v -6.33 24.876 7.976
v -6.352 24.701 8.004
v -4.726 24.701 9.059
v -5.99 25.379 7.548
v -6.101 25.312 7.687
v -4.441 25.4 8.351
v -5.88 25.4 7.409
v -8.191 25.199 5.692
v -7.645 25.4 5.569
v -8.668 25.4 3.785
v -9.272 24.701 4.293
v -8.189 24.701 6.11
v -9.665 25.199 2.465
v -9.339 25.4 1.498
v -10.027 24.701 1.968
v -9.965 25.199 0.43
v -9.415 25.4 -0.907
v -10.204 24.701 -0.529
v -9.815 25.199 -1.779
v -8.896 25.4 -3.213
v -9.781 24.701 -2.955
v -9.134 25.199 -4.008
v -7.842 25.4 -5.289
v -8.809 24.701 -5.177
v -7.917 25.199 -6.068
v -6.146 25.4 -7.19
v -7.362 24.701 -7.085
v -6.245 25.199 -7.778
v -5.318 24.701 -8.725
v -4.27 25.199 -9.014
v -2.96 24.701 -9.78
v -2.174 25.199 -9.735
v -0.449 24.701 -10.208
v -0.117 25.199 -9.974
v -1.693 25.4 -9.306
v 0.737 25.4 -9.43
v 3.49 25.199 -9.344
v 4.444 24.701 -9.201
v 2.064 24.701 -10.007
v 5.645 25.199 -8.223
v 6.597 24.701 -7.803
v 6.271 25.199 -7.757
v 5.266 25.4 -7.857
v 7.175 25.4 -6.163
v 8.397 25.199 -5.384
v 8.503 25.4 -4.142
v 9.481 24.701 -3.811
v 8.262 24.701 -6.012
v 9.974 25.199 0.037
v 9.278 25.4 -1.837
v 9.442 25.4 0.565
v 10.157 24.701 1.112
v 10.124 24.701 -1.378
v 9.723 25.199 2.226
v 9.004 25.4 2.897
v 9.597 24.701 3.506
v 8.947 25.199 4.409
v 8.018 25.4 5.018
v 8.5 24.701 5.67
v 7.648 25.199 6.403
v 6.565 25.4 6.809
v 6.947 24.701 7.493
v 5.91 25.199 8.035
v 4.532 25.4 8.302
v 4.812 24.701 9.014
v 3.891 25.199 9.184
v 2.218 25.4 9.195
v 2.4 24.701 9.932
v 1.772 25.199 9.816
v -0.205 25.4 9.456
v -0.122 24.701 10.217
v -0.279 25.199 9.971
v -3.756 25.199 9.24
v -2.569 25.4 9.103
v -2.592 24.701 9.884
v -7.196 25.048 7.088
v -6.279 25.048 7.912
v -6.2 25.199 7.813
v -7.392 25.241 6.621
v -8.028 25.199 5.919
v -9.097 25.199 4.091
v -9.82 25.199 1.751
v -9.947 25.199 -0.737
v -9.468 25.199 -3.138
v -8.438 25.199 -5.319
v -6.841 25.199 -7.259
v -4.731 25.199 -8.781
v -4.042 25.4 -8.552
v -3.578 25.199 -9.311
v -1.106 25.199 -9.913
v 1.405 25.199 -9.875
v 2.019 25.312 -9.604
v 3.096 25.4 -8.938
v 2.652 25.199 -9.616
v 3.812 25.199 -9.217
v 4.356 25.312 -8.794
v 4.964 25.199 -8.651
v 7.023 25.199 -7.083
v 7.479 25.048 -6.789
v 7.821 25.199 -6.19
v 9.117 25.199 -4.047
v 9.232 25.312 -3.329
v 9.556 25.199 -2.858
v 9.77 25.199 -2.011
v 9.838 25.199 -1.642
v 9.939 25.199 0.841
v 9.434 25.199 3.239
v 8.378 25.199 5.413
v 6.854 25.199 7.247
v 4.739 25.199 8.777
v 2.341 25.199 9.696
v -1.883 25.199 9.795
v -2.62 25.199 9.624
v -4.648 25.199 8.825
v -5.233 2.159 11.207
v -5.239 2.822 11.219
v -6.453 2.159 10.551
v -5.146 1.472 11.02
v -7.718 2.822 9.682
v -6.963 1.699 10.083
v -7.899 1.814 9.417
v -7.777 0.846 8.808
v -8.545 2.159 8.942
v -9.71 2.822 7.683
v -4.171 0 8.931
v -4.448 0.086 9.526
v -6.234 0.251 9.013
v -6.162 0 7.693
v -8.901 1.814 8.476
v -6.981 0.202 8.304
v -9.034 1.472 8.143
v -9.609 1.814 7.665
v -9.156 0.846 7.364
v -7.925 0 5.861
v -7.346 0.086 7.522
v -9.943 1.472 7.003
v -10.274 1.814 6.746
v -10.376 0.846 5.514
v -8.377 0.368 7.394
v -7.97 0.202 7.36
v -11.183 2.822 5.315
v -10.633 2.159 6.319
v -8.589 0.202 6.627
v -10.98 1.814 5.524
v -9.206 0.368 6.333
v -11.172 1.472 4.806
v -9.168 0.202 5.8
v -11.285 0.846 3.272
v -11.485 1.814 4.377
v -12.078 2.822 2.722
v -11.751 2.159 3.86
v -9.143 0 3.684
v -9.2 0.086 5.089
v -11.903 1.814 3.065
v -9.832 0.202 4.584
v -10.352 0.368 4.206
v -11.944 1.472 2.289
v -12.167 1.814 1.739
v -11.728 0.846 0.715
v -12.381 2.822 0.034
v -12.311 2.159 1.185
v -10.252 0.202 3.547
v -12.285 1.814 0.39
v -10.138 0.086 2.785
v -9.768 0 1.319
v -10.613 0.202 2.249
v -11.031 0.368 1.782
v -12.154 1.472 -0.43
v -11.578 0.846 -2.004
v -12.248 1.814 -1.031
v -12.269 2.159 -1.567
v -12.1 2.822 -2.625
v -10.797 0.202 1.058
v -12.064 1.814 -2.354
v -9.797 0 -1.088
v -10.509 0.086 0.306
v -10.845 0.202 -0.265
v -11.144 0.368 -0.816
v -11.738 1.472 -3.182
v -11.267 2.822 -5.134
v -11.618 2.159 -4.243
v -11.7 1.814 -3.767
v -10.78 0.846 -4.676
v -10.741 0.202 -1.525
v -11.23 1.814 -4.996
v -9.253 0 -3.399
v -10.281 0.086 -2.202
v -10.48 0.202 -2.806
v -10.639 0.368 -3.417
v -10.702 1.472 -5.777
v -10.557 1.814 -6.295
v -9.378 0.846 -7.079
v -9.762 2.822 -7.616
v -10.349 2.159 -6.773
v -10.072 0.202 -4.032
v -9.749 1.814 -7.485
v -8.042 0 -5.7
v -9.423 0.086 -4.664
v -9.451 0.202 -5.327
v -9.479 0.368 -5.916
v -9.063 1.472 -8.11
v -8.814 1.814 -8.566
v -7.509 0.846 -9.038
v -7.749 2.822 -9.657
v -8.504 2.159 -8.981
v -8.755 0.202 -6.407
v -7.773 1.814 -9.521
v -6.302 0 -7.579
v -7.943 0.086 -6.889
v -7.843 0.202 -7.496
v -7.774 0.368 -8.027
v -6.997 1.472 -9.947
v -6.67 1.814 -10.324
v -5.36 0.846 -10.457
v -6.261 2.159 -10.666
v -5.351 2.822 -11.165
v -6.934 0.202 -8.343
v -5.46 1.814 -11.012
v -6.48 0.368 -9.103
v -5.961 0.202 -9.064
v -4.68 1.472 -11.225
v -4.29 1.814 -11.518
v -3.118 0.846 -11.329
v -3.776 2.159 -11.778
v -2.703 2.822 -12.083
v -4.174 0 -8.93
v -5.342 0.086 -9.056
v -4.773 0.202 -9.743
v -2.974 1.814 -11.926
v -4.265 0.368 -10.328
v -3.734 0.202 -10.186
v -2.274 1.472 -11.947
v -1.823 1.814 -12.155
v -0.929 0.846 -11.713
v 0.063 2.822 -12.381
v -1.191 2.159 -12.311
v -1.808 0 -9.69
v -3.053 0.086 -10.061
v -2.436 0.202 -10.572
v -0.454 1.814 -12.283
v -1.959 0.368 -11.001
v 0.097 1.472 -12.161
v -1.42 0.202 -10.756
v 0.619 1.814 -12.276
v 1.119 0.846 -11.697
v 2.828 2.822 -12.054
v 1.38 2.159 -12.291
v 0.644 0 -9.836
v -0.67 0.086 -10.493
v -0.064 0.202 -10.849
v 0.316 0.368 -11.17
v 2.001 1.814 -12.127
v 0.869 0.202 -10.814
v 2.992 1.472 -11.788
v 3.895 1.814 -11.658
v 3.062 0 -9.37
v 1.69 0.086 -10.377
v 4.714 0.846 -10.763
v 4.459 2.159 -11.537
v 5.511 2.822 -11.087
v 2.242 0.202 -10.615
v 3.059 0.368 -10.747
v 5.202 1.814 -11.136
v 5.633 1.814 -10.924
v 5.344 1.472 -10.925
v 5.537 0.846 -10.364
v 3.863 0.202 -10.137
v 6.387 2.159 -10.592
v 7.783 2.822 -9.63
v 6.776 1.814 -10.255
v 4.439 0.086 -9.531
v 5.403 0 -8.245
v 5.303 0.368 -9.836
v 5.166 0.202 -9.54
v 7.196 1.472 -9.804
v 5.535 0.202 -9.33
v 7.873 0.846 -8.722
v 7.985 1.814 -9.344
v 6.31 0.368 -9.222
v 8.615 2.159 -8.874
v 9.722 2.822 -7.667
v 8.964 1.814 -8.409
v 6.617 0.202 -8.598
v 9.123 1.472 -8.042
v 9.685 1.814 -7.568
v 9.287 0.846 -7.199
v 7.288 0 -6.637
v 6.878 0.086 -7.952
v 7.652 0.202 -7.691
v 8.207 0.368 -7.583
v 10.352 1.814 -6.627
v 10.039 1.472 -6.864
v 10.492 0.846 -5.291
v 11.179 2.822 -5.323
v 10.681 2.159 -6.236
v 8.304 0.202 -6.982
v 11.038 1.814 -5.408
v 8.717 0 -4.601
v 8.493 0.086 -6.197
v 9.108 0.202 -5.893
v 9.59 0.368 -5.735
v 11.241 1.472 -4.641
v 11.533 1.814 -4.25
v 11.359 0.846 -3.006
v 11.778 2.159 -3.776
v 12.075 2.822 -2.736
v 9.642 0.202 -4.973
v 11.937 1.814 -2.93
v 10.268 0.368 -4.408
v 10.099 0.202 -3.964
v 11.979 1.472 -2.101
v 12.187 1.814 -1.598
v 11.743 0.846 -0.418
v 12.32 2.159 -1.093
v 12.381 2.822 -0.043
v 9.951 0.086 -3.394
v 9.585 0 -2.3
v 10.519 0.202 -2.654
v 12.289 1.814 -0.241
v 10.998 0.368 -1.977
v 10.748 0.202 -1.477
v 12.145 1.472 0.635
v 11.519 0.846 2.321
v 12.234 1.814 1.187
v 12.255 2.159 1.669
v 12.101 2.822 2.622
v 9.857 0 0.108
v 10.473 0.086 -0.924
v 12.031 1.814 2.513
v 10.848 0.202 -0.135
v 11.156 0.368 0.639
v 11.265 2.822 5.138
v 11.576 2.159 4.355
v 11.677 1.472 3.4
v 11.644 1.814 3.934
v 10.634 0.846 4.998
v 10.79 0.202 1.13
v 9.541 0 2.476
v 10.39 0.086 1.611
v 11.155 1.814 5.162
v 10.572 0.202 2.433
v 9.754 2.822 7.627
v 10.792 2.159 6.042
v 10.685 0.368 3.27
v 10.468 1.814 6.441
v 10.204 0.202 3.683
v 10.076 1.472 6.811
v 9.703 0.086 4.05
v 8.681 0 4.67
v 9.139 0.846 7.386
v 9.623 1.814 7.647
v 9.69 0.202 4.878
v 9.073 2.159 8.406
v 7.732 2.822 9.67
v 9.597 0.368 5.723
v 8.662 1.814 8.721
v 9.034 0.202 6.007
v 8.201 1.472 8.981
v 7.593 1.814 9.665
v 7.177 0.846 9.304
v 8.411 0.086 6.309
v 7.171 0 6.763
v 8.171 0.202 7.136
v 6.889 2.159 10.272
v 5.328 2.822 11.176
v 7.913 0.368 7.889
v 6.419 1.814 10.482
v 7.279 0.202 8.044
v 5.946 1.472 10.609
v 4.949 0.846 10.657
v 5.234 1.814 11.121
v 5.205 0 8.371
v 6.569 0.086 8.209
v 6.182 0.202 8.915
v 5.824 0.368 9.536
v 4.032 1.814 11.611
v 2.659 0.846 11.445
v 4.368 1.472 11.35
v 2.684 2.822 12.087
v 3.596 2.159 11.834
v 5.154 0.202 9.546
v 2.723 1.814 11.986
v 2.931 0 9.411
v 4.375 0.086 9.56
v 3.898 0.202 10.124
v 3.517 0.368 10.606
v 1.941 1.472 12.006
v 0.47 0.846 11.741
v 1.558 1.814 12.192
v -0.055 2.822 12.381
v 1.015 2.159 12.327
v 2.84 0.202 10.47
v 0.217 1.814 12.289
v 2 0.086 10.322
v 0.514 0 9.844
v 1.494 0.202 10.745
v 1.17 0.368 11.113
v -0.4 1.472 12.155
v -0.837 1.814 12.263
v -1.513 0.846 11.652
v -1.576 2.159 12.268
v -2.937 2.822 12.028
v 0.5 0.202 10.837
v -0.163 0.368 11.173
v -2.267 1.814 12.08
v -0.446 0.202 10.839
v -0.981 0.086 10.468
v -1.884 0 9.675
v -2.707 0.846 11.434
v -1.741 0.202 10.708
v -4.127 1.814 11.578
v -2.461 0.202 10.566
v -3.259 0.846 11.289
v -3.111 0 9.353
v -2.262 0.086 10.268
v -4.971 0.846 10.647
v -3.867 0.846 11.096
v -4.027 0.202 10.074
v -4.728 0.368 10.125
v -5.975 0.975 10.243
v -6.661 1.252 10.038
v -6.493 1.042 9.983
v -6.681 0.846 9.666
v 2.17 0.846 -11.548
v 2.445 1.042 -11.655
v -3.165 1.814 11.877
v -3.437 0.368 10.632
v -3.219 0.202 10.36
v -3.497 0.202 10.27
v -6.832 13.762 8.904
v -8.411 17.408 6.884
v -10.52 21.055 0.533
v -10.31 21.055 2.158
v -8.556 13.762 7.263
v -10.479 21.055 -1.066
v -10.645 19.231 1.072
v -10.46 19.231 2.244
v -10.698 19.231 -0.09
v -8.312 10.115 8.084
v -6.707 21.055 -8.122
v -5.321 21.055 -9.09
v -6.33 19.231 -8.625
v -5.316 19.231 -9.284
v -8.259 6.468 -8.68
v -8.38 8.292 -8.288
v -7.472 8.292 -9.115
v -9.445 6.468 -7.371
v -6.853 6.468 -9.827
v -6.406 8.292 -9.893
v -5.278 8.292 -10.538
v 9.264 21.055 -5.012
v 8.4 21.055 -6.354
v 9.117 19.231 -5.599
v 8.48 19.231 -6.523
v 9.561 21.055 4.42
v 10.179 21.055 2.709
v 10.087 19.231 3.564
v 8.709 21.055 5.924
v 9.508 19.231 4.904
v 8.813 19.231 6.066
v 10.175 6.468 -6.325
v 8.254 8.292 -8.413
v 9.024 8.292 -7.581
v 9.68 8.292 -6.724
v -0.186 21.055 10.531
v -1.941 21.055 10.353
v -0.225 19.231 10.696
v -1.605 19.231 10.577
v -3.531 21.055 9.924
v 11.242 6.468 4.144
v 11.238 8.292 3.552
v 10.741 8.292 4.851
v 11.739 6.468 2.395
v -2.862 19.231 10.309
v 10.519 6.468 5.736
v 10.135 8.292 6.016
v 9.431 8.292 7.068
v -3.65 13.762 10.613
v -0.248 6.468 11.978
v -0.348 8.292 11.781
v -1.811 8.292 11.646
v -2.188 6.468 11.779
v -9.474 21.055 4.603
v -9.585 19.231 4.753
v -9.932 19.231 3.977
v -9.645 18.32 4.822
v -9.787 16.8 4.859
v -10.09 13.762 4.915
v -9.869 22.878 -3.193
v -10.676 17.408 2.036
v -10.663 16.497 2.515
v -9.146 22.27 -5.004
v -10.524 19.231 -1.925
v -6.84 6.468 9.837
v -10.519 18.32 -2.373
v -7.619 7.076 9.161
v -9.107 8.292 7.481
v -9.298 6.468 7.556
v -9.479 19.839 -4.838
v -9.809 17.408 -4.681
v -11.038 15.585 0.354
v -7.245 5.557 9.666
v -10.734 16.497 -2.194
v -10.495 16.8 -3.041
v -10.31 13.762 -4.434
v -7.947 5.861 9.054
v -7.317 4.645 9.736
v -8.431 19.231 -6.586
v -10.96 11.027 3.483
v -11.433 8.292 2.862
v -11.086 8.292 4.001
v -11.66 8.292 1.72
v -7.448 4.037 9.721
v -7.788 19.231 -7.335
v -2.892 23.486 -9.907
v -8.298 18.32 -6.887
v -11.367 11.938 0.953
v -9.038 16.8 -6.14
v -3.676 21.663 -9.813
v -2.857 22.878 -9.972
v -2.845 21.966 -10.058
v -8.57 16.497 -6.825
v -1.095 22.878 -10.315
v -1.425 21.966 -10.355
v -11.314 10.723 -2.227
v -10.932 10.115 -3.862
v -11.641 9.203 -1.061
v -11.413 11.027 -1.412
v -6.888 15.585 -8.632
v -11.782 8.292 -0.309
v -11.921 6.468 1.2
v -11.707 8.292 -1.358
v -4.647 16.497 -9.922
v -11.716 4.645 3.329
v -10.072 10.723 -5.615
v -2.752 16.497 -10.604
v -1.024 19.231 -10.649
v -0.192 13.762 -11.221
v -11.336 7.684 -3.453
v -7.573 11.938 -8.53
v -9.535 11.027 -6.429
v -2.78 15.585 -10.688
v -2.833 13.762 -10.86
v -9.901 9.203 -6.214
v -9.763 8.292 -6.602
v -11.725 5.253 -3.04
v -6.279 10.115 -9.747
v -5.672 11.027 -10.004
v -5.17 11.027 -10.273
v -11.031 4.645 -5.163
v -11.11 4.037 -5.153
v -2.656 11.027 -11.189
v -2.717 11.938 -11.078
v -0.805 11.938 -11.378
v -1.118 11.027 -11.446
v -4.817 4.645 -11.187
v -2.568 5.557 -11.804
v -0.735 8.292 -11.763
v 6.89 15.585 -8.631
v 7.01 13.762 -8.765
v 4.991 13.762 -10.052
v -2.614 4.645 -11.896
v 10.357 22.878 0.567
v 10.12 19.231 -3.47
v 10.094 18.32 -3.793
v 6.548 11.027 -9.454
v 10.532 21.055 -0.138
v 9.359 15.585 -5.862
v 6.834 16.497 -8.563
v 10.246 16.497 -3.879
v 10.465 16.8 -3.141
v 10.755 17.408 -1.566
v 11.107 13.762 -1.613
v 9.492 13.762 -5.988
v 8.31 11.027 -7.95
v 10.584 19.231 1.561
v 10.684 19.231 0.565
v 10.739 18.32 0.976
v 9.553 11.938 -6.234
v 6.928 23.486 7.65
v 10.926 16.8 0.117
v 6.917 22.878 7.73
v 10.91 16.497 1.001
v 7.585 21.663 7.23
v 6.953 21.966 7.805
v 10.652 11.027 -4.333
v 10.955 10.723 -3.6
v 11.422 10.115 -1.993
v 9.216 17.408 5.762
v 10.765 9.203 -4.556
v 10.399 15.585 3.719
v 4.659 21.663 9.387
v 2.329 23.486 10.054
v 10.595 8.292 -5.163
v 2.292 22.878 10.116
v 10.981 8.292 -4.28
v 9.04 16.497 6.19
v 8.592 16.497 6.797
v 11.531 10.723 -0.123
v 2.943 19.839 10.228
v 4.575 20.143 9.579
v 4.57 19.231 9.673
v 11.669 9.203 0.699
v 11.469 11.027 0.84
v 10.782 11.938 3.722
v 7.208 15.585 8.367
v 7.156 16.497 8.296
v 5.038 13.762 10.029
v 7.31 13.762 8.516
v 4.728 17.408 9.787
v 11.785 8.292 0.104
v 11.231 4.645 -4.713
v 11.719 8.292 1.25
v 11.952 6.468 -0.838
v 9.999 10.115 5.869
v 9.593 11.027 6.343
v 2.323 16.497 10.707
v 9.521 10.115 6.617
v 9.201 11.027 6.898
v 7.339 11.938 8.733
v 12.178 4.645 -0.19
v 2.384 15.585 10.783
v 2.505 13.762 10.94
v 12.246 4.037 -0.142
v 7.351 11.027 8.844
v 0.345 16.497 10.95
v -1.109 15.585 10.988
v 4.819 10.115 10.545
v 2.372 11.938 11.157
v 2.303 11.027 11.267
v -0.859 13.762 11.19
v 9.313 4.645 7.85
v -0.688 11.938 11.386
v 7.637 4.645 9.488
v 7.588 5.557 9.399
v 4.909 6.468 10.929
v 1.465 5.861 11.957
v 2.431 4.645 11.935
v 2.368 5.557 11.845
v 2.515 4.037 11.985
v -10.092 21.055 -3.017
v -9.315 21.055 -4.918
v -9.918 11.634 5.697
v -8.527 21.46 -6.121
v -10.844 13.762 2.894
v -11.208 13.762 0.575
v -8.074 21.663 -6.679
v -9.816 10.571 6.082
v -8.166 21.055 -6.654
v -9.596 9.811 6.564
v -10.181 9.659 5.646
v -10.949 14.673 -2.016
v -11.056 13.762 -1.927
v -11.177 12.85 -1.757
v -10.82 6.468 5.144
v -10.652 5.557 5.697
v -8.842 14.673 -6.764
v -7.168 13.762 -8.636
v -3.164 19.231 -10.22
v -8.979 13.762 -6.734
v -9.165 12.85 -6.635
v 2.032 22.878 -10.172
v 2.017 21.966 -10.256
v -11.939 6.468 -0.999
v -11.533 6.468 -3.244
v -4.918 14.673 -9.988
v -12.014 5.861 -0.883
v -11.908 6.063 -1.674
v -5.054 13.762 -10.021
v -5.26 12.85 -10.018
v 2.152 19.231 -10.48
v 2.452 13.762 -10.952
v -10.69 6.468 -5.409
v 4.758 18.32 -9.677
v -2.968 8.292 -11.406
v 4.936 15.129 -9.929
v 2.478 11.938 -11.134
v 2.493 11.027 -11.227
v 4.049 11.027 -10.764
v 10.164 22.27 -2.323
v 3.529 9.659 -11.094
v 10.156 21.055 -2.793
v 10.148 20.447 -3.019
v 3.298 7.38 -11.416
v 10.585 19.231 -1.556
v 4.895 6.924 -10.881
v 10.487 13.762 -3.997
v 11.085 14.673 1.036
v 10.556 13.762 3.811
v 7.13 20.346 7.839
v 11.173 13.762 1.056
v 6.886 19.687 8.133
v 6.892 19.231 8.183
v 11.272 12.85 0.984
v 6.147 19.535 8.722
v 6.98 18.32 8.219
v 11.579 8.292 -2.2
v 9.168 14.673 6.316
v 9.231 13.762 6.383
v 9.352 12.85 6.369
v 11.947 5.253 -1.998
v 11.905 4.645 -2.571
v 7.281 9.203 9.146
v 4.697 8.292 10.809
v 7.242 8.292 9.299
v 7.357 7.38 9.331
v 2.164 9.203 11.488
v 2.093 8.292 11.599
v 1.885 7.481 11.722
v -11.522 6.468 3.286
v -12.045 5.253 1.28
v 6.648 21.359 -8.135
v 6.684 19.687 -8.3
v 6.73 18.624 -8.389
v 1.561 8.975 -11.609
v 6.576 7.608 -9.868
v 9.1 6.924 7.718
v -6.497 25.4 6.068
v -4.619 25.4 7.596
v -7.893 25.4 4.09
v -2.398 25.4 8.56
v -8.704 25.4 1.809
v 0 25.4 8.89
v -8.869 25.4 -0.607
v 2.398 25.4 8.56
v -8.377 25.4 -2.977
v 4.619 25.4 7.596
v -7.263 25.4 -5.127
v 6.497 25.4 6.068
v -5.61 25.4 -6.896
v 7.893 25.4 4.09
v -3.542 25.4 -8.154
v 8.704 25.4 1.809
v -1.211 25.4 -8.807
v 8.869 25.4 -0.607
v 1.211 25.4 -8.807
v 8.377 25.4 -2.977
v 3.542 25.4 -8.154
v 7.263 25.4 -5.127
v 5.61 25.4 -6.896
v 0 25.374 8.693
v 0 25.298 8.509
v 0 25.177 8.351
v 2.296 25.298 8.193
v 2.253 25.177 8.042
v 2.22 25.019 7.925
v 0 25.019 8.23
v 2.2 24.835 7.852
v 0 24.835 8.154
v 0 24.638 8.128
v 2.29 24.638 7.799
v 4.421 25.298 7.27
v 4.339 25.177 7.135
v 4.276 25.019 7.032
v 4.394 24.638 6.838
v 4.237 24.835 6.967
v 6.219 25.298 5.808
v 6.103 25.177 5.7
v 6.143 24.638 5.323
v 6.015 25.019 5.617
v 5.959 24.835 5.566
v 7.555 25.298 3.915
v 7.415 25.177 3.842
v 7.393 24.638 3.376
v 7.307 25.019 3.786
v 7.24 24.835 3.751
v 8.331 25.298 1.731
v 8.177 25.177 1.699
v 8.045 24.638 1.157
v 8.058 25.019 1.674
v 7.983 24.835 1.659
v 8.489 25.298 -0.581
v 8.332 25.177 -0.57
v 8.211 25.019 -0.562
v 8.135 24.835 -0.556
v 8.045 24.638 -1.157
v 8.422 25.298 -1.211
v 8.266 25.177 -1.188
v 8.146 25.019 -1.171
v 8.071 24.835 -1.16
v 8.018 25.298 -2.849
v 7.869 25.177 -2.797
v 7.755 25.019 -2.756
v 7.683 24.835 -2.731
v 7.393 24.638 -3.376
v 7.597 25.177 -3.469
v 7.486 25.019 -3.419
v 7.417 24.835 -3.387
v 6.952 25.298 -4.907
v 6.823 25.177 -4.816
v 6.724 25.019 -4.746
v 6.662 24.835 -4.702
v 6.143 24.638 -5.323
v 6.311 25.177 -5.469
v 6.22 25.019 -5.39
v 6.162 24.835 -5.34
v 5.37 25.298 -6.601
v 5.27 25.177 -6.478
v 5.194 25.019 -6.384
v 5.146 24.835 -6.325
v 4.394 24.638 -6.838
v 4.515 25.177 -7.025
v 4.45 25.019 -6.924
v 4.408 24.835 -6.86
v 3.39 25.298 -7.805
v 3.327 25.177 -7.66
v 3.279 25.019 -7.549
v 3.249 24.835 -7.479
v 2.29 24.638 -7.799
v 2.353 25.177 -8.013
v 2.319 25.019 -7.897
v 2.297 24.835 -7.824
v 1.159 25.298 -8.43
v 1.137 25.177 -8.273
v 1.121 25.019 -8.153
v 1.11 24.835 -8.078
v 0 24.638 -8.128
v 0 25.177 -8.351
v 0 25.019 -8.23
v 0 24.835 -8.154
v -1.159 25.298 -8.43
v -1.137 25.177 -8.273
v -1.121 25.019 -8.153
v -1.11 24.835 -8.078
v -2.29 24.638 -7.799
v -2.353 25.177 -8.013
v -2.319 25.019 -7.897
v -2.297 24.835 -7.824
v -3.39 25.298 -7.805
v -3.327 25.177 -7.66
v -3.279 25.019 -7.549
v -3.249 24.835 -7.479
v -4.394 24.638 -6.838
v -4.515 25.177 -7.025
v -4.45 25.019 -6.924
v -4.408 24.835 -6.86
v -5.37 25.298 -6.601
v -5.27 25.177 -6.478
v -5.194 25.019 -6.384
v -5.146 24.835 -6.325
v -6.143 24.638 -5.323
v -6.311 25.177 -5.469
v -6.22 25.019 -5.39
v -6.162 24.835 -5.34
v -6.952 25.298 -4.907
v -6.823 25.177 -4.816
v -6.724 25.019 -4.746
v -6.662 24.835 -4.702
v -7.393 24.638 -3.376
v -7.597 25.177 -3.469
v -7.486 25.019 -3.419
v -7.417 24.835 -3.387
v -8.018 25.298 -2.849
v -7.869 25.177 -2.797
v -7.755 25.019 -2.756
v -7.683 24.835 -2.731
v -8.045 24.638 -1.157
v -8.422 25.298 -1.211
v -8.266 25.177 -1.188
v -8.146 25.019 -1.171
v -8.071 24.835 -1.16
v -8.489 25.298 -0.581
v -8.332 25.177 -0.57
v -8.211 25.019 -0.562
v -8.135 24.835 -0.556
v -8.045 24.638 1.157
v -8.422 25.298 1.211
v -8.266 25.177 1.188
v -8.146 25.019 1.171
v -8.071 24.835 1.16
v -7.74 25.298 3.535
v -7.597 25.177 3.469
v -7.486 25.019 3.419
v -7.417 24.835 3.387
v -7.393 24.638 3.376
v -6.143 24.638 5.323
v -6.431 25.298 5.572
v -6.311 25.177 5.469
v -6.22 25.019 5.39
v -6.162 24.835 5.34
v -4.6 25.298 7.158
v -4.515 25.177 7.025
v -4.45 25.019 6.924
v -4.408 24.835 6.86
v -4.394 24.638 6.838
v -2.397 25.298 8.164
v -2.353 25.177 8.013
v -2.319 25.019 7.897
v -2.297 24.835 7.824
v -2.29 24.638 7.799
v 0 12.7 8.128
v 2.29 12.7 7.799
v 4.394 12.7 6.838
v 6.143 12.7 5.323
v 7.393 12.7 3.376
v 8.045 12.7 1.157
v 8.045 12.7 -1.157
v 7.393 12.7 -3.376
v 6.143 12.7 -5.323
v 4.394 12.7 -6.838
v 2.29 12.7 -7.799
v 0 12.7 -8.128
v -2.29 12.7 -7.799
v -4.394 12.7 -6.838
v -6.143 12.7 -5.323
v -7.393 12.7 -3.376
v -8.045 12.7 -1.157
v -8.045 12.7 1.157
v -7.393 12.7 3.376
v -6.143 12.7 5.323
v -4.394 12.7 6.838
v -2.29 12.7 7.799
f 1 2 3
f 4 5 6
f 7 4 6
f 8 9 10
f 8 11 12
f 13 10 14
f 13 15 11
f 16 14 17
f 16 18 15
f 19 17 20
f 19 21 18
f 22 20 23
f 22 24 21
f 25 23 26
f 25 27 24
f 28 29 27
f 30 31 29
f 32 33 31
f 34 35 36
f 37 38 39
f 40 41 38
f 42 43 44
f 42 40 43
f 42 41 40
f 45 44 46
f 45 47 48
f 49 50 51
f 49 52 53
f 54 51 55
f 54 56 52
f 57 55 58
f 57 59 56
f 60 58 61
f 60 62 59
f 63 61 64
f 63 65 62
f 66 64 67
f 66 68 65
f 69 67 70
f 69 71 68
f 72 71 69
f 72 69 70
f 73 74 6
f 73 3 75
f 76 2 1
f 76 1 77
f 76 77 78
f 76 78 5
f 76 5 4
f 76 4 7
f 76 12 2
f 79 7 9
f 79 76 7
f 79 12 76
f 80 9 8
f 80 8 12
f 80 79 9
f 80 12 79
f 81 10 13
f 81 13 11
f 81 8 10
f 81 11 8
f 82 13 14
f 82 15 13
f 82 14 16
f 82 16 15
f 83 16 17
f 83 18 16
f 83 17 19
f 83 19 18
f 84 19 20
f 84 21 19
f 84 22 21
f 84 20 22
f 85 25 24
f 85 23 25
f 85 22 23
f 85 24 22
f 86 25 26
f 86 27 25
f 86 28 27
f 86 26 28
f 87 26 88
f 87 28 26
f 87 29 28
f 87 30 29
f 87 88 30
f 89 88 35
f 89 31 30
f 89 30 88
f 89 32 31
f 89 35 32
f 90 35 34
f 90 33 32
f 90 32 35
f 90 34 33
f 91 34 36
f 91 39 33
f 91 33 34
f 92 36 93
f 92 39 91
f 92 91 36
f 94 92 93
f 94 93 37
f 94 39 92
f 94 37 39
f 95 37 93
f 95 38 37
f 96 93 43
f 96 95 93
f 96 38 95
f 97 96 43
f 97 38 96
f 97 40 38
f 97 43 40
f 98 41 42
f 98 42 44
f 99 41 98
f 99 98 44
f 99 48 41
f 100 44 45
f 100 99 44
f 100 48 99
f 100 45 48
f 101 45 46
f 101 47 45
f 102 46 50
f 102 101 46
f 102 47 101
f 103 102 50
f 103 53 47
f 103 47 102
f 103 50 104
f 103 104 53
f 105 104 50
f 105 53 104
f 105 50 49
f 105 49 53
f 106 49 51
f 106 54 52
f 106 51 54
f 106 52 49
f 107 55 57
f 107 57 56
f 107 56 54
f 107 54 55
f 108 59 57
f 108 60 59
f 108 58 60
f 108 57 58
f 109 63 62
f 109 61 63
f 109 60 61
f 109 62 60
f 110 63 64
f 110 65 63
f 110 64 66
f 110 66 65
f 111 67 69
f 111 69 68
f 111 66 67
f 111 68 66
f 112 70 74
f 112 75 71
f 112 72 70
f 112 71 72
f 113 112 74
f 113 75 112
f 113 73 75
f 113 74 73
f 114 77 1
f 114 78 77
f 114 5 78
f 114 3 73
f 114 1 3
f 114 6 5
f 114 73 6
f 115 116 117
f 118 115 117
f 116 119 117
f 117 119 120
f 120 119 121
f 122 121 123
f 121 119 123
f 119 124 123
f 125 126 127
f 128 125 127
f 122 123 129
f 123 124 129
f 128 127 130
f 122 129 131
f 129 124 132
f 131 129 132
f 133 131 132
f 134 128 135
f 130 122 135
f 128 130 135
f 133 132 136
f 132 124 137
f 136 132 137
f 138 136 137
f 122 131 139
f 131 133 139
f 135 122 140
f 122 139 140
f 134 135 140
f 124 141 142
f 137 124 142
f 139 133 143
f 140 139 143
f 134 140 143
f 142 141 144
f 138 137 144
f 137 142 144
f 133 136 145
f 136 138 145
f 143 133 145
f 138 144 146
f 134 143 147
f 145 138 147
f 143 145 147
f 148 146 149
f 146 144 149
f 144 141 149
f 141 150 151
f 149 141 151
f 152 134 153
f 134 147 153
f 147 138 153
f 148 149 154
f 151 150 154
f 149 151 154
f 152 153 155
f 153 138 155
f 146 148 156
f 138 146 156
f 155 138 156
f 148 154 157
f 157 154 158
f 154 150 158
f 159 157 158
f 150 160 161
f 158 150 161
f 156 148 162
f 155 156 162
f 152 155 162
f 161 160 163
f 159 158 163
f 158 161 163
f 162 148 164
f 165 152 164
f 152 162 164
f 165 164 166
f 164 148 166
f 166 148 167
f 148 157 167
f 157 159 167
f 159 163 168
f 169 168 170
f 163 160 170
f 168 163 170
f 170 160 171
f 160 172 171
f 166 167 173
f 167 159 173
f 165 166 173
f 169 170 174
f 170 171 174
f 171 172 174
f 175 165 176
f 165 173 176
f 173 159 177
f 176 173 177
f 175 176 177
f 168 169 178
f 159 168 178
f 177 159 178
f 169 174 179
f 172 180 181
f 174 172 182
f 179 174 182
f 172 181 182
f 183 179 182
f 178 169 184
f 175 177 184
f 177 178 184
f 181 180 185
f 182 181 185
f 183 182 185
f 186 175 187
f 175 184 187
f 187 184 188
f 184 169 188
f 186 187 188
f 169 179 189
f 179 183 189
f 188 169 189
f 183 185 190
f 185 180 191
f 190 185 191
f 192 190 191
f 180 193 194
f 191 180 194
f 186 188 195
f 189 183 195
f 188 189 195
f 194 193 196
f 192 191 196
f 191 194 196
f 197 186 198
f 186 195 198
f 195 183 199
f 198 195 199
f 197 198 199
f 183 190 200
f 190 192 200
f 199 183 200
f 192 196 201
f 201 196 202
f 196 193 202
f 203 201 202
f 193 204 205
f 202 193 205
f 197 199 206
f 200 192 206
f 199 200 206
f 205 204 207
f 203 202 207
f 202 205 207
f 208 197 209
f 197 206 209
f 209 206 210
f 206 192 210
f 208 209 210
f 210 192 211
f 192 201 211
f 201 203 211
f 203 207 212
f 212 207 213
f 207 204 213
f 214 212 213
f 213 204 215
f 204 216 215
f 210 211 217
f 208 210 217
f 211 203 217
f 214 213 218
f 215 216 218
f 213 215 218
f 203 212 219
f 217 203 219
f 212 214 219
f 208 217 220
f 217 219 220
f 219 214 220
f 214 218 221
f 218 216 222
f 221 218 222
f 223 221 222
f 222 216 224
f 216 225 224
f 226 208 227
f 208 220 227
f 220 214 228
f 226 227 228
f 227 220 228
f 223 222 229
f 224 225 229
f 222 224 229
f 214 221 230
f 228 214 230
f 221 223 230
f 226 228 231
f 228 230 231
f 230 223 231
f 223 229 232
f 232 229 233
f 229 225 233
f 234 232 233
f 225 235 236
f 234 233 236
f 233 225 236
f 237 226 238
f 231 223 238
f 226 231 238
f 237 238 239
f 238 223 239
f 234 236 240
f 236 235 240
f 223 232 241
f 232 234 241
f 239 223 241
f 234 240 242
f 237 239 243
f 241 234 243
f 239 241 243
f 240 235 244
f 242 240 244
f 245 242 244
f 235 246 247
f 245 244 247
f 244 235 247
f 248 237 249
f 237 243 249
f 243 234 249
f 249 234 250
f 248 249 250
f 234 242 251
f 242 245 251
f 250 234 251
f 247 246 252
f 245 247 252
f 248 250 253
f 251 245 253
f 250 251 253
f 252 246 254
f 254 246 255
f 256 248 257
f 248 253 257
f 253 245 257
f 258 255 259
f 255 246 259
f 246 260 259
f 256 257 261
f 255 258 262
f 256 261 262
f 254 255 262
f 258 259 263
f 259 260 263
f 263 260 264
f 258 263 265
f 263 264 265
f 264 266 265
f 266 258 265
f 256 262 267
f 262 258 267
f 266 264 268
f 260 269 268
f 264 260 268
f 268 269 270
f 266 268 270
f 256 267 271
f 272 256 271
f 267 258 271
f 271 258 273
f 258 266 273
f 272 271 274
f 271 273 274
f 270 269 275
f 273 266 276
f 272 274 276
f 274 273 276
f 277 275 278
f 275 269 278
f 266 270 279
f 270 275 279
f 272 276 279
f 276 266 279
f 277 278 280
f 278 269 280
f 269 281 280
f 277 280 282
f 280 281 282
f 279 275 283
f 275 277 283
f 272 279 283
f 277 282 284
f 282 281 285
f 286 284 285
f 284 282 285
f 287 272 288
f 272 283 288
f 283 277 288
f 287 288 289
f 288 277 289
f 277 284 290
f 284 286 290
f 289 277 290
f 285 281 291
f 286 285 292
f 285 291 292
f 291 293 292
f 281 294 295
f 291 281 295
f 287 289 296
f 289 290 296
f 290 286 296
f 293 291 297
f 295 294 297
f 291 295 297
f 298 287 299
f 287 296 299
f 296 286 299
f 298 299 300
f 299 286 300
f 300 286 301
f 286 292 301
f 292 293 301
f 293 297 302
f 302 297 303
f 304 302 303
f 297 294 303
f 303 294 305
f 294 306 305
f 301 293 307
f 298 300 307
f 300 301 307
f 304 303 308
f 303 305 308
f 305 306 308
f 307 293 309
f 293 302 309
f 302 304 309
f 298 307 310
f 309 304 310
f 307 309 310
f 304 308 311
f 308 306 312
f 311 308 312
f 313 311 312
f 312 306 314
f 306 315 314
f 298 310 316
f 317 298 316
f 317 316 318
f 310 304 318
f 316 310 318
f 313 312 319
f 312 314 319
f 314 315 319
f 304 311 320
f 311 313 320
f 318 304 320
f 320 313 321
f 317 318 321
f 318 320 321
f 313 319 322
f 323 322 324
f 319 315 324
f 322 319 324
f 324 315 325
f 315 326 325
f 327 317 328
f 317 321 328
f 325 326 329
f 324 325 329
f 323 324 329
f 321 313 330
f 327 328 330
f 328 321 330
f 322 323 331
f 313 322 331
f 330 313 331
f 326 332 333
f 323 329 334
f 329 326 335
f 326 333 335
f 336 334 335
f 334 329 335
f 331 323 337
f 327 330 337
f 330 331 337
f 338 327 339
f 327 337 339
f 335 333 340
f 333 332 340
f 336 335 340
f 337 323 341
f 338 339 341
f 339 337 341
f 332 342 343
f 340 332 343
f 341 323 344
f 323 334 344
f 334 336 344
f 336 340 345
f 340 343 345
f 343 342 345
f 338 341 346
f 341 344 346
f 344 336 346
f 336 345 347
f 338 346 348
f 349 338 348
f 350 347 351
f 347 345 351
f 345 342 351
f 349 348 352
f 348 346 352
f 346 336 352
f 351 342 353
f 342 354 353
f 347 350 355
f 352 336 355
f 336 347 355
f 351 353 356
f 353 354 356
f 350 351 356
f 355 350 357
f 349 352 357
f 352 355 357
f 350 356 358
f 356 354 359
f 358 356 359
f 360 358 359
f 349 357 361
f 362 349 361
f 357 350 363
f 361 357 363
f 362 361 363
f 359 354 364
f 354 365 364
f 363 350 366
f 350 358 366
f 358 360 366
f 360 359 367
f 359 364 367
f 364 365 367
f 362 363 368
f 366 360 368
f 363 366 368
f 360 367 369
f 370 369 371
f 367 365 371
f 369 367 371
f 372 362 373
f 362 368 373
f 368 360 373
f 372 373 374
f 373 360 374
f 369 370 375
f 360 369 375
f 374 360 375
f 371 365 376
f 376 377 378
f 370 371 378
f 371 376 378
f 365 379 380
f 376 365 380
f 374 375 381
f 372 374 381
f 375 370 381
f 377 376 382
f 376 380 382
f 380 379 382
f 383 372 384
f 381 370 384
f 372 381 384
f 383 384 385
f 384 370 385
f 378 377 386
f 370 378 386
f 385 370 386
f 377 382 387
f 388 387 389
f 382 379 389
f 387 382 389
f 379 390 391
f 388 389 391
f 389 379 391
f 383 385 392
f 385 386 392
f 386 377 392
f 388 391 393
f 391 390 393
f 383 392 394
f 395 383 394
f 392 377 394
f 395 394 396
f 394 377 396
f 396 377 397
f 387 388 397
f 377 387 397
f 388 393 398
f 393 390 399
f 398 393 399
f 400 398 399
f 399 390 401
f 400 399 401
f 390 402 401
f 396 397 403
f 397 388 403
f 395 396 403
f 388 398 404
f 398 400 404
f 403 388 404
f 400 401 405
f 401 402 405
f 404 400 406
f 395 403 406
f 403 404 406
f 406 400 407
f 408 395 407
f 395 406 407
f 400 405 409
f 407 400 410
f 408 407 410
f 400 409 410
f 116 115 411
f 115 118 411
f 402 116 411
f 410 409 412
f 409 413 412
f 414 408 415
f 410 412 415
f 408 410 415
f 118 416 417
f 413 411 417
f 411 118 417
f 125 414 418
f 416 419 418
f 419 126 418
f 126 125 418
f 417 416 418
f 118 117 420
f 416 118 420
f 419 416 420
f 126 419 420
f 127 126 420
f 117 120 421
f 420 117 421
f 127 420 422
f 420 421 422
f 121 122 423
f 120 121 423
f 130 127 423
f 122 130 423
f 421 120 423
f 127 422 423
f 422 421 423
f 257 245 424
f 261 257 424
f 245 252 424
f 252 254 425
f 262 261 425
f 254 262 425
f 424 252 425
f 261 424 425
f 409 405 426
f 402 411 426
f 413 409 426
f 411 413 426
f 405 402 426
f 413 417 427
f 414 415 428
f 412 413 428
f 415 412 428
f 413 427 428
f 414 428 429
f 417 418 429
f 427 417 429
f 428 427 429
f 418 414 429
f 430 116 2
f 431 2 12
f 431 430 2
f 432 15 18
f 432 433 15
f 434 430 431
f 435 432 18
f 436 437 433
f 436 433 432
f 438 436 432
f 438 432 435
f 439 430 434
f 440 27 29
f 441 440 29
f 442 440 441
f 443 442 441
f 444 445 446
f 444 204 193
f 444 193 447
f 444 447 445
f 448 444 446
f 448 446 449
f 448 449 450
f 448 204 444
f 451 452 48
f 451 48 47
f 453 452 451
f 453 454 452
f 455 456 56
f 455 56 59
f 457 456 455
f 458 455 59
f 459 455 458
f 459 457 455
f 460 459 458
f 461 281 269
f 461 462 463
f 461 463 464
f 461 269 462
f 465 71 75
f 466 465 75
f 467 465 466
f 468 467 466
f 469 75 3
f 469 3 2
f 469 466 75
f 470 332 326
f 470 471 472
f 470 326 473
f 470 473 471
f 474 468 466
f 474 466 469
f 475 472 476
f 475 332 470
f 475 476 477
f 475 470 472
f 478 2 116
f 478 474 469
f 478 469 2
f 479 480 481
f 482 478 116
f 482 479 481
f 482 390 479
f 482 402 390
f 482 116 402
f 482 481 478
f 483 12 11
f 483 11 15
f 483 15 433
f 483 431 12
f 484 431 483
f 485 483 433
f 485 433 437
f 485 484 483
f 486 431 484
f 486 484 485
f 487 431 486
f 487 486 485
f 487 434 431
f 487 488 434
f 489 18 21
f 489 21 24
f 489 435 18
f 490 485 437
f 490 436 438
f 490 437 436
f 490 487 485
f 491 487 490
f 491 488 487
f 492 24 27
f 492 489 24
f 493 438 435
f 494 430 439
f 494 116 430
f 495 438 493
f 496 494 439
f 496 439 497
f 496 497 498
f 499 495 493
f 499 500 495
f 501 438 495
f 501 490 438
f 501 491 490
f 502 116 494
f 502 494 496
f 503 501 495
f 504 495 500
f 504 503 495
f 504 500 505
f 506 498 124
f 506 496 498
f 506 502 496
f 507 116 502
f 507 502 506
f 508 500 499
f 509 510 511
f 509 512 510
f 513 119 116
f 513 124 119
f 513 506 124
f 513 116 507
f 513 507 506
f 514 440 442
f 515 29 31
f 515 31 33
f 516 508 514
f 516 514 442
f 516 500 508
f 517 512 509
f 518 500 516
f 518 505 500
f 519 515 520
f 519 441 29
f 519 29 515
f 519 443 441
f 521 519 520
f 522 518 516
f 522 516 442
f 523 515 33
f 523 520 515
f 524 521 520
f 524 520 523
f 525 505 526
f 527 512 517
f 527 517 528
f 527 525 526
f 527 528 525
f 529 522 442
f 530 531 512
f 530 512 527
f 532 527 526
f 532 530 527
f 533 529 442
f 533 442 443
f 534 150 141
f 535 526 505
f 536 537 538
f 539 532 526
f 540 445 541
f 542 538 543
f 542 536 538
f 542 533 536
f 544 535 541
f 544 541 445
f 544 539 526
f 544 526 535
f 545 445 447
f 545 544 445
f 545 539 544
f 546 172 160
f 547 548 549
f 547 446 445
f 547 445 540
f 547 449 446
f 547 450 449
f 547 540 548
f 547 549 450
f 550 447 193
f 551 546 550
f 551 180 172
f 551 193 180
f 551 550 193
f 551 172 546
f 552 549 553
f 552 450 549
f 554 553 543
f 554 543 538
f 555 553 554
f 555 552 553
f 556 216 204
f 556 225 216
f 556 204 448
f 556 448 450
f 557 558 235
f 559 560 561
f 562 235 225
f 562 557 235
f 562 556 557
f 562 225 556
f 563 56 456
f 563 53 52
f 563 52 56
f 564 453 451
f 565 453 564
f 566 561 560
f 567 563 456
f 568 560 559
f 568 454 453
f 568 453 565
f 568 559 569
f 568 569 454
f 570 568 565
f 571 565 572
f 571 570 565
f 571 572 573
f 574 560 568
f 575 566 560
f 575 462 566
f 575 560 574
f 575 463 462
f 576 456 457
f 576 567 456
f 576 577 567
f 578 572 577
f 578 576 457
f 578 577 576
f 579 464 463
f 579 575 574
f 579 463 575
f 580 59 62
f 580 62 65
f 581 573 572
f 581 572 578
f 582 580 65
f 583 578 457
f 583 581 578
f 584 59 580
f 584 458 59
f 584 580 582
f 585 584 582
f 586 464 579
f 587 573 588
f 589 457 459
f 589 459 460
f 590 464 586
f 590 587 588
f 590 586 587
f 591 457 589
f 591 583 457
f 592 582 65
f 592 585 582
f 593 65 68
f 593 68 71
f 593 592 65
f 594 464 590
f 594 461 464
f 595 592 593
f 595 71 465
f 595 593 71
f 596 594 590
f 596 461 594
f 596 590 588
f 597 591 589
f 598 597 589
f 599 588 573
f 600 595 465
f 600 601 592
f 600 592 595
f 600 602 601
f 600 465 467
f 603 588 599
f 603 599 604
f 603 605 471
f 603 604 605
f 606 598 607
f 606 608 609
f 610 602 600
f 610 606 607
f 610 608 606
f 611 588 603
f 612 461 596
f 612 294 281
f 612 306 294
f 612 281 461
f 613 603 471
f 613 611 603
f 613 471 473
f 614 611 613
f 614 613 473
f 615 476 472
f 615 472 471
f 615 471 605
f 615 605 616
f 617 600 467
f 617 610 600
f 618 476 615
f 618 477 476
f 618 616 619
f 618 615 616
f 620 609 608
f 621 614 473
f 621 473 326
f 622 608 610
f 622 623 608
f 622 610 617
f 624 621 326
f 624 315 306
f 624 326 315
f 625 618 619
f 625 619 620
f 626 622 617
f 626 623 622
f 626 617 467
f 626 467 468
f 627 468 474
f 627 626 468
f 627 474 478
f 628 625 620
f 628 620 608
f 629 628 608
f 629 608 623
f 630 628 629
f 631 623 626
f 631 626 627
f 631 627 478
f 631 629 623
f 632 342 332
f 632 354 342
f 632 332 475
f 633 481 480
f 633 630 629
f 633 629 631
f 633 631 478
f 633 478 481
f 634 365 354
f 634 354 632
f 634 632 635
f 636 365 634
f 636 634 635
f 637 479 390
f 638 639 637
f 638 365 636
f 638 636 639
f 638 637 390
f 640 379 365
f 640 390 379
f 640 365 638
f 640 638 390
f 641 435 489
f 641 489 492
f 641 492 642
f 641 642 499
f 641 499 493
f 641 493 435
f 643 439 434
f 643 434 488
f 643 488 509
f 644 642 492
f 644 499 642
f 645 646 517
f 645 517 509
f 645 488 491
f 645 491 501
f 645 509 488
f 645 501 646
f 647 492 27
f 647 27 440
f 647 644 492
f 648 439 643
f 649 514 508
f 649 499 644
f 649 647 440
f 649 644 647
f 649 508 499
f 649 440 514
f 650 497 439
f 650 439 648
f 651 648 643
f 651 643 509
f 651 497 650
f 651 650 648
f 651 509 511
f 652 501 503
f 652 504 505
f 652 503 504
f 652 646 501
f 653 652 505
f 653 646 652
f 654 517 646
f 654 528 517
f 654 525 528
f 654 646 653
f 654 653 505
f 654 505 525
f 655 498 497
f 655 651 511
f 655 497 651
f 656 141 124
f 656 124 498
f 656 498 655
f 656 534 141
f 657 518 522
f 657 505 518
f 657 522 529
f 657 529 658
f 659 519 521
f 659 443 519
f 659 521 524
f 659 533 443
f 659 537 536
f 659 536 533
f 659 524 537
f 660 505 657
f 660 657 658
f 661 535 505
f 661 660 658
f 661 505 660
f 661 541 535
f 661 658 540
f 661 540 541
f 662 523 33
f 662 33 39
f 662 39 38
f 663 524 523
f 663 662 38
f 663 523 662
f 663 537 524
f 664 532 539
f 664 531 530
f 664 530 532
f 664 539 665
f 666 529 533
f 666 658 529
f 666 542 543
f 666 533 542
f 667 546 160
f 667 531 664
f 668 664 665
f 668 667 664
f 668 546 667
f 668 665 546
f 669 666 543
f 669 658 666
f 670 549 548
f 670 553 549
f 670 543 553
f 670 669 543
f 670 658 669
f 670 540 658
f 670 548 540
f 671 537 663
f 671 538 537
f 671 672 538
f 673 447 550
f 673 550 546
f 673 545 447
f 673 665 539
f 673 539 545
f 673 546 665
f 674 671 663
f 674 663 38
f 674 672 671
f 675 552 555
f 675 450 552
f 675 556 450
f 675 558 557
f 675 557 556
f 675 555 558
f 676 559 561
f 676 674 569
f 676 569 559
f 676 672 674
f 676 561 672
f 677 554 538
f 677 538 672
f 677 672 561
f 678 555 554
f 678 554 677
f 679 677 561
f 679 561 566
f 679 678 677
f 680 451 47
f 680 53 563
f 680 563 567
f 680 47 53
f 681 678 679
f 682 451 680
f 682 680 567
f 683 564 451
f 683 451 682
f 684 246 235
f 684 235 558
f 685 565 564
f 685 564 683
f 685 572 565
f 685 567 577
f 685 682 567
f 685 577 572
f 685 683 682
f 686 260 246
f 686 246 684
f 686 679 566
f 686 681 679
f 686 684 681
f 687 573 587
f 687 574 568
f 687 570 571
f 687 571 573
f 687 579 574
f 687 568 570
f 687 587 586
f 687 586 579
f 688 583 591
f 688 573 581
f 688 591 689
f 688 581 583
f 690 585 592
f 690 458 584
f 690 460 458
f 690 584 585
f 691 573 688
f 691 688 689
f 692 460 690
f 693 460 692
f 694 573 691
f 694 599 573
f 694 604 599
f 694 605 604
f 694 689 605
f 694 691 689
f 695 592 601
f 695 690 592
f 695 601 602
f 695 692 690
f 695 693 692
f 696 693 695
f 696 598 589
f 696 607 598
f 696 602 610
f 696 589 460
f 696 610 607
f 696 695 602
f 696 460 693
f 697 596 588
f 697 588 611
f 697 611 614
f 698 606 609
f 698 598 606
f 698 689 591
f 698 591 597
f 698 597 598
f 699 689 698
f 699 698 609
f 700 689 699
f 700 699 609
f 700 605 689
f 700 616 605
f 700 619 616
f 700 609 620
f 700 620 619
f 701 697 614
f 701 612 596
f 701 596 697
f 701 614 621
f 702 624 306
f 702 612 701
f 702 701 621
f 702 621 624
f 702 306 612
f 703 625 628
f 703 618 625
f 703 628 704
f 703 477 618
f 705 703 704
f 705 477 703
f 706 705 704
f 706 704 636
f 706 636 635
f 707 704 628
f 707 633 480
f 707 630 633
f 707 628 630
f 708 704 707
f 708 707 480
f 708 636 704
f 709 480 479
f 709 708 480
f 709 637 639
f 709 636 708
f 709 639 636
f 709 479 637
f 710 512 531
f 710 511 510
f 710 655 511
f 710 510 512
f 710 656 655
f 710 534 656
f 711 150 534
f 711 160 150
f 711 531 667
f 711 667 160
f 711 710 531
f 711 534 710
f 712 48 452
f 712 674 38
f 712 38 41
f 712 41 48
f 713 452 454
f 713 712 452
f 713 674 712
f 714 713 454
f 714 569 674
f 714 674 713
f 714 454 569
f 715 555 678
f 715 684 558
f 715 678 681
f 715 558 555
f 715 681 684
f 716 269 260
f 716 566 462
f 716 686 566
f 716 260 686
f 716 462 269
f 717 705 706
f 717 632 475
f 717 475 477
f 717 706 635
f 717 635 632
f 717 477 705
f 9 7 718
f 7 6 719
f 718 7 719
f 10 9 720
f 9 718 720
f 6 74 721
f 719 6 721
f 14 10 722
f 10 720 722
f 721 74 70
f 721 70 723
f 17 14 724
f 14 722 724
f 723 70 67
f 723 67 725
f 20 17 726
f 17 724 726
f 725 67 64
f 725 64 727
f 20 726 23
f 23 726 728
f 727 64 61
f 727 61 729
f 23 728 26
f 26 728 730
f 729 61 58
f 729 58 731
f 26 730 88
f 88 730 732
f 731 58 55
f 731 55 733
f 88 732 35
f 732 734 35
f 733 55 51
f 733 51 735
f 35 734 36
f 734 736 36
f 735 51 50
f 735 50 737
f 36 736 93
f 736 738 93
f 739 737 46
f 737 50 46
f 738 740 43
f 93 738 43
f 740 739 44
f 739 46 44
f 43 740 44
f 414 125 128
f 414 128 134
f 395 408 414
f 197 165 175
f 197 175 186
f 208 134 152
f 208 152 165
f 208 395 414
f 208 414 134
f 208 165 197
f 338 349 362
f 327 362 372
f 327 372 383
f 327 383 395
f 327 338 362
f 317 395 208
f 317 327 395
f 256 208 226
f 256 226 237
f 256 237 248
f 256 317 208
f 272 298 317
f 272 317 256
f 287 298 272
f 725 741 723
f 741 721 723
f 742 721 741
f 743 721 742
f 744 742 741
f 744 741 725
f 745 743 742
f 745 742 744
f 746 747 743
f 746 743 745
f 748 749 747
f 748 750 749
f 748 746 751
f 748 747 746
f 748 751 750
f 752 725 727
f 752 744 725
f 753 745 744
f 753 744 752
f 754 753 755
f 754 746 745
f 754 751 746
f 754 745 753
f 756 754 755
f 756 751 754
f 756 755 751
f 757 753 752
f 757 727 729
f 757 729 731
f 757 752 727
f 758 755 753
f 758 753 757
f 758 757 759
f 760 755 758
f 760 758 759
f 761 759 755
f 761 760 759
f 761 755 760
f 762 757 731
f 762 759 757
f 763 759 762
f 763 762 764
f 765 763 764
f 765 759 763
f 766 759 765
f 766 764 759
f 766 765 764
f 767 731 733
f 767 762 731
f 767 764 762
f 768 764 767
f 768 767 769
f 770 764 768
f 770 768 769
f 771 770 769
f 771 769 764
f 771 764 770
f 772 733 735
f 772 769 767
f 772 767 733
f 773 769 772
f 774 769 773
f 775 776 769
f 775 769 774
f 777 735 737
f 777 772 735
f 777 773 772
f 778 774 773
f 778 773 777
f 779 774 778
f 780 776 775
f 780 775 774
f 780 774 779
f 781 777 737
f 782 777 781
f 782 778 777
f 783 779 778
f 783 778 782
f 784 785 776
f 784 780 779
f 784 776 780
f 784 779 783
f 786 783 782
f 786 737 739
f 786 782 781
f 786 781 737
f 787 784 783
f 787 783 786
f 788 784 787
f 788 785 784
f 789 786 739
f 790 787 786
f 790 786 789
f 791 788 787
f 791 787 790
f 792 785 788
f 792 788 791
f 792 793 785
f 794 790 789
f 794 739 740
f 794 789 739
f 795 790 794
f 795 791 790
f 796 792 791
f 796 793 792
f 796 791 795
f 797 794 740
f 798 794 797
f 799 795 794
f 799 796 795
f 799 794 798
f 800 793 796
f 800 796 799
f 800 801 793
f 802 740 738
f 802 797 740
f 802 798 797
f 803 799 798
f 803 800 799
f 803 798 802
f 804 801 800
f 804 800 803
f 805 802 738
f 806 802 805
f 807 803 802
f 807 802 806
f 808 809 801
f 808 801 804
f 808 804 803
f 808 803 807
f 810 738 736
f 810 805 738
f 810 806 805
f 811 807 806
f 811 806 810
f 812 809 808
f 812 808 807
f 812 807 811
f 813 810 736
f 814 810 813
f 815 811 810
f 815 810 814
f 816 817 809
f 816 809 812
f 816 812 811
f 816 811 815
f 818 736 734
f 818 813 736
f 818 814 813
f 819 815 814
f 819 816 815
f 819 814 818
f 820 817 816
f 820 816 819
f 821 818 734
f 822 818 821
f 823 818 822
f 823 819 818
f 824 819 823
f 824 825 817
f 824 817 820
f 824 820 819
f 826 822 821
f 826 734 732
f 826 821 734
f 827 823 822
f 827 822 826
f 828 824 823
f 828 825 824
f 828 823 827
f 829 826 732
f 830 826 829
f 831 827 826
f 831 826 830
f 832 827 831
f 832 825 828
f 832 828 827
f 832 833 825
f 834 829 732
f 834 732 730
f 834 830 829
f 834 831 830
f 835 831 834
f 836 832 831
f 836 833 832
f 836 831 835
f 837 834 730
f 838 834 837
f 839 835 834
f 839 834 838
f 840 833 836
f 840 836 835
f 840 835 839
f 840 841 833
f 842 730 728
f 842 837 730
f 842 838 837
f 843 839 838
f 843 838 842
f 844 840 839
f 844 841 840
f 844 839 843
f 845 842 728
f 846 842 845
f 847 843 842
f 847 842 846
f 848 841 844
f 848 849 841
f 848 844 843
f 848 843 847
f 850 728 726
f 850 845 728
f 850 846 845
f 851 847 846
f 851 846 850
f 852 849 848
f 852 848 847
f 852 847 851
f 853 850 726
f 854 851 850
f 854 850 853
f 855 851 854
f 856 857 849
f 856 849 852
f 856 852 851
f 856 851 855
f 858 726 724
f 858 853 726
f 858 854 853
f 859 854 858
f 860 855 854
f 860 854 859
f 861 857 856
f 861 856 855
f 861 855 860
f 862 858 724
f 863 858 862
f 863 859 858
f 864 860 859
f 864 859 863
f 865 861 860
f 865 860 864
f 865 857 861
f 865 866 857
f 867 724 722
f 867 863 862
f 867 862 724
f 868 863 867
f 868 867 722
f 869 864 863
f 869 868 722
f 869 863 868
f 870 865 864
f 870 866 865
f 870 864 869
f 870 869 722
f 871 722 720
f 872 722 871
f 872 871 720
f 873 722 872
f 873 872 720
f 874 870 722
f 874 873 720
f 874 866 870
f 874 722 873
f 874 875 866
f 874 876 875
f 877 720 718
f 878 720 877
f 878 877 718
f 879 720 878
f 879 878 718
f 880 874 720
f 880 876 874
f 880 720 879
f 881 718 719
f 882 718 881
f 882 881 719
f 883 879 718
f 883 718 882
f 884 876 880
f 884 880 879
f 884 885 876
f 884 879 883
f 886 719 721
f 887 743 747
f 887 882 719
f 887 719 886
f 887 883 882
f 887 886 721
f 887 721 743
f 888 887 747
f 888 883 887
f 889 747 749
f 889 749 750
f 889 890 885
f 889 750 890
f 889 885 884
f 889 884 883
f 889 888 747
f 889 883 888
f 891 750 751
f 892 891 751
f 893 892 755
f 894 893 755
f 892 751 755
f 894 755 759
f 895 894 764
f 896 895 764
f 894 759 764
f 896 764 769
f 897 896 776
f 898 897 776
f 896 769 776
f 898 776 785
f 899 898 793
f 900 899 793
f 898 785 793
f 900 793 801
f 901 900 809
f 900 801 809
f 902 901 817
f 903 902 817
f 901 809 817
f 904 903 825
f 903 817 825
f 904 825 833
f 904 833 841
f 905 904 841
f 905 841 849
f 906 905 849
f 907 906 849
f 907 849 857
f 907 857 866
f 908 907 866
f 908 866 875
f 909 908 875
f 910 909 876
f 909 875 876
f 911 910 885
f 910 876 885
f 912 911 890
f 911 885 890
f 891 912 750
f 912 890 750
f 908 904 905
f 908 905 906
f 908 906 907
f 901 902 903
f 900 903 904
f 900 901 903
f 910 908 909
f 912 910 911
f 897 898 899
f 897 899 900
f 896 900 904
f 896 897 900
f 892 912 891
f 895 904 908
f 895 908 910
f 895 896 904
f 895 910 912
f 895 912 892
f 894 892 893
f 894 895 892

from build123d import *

# Parameters (mm, degrees)
SKETCH2_R          = 8.128
CUT_EXTRUDE1_DEPTH = 12.7
FILLET1_R          = 2.54
FILLET2_R          = 0.762


with BuildPart() as part:
    # Loft1: read off the stored shape, not the designer's step
    # Loft1: loft between two sections, ruled curve by curve
    loft1_from = [
        Edge.make_bspline([(-6.387278158, 25.4, 7.901156734), (-22.189591626, 25.4, -4.873399581), (-9.41503531, 25.4, -20.675713049), (6.387278158, 25.4, -7.901156734), (22.189591626, 25.4, 4.873399581), (9.41503531, 25.4, 20.675713049), (-6.387278158, 25.4, 7.901156734)], [0, 0, 0, 0, 0.5, 0.5, 0.5, 1, 1, 1, 1], 3, [1, 0.333333333, 0.333333333, 1, 0.333333333, 0.333333333, 1]),
    ]
    loft1_to = [
        Edge.make_bspline([(-5.094992756, 0, 11.633187388), (-28.361367533, 0, 1.443201876), (-18.17138202, 0, -21.823172901), (5.094992756, 0, -11.633187388), (28.361367533, 0, -1.443201876), (18.17138202, 0, 21.823172901), (-5.094992756, 0, 11.633187388)], [0, 0, 0, 0, 0.5, 0.5, 0.5, 1, 1, 1, 1], 3, [1, 0.333333333, 0.333333333, 1, 0.333333333, 0.333333333, 1]),
    ]
    loft1 = Solid(Shell([*[Face.make_surface_from_curves(loft1_from[k], loft1_to[k]) for k in range(1)], Face(Wire(loft1_from)), Face(Wire(loft1_to))]))
    add(loft1)

    # Sketch2 → Cut-Extrude1 (cut)
    with BuildSketch(Plane(origin=(0, 25.4, 0), x_dir=(1, 0, 0), z_dir=(0, 1, 0))):
        with Locations(Location((0, 0, 0), (0, 0, 270))):
            Circle(SKETCH2_R)
    extrude(amount=-CUT_EXTRUDE1_DEPTH, mode=Mode.SUBTRACT)

    # Fillet1
    fillet1_edges = [part.edges().sort_by_distance(p)[0] for p in [
        (5.094992756, 0, -11.633187388),
    ]]
    fillet(fillet1_edges, radius=FILLET1_R)

    # Fillet2
    fillet2_edges = [part.edges().sort_by_distance(p)[0] for p in [
        (6.387278158, 25.4, -7.901156734),
        (0, 25.4, -8.128),
    ]]
    fillet(fillet2_edges, radius=FILLET2_R)


solid = part.part
